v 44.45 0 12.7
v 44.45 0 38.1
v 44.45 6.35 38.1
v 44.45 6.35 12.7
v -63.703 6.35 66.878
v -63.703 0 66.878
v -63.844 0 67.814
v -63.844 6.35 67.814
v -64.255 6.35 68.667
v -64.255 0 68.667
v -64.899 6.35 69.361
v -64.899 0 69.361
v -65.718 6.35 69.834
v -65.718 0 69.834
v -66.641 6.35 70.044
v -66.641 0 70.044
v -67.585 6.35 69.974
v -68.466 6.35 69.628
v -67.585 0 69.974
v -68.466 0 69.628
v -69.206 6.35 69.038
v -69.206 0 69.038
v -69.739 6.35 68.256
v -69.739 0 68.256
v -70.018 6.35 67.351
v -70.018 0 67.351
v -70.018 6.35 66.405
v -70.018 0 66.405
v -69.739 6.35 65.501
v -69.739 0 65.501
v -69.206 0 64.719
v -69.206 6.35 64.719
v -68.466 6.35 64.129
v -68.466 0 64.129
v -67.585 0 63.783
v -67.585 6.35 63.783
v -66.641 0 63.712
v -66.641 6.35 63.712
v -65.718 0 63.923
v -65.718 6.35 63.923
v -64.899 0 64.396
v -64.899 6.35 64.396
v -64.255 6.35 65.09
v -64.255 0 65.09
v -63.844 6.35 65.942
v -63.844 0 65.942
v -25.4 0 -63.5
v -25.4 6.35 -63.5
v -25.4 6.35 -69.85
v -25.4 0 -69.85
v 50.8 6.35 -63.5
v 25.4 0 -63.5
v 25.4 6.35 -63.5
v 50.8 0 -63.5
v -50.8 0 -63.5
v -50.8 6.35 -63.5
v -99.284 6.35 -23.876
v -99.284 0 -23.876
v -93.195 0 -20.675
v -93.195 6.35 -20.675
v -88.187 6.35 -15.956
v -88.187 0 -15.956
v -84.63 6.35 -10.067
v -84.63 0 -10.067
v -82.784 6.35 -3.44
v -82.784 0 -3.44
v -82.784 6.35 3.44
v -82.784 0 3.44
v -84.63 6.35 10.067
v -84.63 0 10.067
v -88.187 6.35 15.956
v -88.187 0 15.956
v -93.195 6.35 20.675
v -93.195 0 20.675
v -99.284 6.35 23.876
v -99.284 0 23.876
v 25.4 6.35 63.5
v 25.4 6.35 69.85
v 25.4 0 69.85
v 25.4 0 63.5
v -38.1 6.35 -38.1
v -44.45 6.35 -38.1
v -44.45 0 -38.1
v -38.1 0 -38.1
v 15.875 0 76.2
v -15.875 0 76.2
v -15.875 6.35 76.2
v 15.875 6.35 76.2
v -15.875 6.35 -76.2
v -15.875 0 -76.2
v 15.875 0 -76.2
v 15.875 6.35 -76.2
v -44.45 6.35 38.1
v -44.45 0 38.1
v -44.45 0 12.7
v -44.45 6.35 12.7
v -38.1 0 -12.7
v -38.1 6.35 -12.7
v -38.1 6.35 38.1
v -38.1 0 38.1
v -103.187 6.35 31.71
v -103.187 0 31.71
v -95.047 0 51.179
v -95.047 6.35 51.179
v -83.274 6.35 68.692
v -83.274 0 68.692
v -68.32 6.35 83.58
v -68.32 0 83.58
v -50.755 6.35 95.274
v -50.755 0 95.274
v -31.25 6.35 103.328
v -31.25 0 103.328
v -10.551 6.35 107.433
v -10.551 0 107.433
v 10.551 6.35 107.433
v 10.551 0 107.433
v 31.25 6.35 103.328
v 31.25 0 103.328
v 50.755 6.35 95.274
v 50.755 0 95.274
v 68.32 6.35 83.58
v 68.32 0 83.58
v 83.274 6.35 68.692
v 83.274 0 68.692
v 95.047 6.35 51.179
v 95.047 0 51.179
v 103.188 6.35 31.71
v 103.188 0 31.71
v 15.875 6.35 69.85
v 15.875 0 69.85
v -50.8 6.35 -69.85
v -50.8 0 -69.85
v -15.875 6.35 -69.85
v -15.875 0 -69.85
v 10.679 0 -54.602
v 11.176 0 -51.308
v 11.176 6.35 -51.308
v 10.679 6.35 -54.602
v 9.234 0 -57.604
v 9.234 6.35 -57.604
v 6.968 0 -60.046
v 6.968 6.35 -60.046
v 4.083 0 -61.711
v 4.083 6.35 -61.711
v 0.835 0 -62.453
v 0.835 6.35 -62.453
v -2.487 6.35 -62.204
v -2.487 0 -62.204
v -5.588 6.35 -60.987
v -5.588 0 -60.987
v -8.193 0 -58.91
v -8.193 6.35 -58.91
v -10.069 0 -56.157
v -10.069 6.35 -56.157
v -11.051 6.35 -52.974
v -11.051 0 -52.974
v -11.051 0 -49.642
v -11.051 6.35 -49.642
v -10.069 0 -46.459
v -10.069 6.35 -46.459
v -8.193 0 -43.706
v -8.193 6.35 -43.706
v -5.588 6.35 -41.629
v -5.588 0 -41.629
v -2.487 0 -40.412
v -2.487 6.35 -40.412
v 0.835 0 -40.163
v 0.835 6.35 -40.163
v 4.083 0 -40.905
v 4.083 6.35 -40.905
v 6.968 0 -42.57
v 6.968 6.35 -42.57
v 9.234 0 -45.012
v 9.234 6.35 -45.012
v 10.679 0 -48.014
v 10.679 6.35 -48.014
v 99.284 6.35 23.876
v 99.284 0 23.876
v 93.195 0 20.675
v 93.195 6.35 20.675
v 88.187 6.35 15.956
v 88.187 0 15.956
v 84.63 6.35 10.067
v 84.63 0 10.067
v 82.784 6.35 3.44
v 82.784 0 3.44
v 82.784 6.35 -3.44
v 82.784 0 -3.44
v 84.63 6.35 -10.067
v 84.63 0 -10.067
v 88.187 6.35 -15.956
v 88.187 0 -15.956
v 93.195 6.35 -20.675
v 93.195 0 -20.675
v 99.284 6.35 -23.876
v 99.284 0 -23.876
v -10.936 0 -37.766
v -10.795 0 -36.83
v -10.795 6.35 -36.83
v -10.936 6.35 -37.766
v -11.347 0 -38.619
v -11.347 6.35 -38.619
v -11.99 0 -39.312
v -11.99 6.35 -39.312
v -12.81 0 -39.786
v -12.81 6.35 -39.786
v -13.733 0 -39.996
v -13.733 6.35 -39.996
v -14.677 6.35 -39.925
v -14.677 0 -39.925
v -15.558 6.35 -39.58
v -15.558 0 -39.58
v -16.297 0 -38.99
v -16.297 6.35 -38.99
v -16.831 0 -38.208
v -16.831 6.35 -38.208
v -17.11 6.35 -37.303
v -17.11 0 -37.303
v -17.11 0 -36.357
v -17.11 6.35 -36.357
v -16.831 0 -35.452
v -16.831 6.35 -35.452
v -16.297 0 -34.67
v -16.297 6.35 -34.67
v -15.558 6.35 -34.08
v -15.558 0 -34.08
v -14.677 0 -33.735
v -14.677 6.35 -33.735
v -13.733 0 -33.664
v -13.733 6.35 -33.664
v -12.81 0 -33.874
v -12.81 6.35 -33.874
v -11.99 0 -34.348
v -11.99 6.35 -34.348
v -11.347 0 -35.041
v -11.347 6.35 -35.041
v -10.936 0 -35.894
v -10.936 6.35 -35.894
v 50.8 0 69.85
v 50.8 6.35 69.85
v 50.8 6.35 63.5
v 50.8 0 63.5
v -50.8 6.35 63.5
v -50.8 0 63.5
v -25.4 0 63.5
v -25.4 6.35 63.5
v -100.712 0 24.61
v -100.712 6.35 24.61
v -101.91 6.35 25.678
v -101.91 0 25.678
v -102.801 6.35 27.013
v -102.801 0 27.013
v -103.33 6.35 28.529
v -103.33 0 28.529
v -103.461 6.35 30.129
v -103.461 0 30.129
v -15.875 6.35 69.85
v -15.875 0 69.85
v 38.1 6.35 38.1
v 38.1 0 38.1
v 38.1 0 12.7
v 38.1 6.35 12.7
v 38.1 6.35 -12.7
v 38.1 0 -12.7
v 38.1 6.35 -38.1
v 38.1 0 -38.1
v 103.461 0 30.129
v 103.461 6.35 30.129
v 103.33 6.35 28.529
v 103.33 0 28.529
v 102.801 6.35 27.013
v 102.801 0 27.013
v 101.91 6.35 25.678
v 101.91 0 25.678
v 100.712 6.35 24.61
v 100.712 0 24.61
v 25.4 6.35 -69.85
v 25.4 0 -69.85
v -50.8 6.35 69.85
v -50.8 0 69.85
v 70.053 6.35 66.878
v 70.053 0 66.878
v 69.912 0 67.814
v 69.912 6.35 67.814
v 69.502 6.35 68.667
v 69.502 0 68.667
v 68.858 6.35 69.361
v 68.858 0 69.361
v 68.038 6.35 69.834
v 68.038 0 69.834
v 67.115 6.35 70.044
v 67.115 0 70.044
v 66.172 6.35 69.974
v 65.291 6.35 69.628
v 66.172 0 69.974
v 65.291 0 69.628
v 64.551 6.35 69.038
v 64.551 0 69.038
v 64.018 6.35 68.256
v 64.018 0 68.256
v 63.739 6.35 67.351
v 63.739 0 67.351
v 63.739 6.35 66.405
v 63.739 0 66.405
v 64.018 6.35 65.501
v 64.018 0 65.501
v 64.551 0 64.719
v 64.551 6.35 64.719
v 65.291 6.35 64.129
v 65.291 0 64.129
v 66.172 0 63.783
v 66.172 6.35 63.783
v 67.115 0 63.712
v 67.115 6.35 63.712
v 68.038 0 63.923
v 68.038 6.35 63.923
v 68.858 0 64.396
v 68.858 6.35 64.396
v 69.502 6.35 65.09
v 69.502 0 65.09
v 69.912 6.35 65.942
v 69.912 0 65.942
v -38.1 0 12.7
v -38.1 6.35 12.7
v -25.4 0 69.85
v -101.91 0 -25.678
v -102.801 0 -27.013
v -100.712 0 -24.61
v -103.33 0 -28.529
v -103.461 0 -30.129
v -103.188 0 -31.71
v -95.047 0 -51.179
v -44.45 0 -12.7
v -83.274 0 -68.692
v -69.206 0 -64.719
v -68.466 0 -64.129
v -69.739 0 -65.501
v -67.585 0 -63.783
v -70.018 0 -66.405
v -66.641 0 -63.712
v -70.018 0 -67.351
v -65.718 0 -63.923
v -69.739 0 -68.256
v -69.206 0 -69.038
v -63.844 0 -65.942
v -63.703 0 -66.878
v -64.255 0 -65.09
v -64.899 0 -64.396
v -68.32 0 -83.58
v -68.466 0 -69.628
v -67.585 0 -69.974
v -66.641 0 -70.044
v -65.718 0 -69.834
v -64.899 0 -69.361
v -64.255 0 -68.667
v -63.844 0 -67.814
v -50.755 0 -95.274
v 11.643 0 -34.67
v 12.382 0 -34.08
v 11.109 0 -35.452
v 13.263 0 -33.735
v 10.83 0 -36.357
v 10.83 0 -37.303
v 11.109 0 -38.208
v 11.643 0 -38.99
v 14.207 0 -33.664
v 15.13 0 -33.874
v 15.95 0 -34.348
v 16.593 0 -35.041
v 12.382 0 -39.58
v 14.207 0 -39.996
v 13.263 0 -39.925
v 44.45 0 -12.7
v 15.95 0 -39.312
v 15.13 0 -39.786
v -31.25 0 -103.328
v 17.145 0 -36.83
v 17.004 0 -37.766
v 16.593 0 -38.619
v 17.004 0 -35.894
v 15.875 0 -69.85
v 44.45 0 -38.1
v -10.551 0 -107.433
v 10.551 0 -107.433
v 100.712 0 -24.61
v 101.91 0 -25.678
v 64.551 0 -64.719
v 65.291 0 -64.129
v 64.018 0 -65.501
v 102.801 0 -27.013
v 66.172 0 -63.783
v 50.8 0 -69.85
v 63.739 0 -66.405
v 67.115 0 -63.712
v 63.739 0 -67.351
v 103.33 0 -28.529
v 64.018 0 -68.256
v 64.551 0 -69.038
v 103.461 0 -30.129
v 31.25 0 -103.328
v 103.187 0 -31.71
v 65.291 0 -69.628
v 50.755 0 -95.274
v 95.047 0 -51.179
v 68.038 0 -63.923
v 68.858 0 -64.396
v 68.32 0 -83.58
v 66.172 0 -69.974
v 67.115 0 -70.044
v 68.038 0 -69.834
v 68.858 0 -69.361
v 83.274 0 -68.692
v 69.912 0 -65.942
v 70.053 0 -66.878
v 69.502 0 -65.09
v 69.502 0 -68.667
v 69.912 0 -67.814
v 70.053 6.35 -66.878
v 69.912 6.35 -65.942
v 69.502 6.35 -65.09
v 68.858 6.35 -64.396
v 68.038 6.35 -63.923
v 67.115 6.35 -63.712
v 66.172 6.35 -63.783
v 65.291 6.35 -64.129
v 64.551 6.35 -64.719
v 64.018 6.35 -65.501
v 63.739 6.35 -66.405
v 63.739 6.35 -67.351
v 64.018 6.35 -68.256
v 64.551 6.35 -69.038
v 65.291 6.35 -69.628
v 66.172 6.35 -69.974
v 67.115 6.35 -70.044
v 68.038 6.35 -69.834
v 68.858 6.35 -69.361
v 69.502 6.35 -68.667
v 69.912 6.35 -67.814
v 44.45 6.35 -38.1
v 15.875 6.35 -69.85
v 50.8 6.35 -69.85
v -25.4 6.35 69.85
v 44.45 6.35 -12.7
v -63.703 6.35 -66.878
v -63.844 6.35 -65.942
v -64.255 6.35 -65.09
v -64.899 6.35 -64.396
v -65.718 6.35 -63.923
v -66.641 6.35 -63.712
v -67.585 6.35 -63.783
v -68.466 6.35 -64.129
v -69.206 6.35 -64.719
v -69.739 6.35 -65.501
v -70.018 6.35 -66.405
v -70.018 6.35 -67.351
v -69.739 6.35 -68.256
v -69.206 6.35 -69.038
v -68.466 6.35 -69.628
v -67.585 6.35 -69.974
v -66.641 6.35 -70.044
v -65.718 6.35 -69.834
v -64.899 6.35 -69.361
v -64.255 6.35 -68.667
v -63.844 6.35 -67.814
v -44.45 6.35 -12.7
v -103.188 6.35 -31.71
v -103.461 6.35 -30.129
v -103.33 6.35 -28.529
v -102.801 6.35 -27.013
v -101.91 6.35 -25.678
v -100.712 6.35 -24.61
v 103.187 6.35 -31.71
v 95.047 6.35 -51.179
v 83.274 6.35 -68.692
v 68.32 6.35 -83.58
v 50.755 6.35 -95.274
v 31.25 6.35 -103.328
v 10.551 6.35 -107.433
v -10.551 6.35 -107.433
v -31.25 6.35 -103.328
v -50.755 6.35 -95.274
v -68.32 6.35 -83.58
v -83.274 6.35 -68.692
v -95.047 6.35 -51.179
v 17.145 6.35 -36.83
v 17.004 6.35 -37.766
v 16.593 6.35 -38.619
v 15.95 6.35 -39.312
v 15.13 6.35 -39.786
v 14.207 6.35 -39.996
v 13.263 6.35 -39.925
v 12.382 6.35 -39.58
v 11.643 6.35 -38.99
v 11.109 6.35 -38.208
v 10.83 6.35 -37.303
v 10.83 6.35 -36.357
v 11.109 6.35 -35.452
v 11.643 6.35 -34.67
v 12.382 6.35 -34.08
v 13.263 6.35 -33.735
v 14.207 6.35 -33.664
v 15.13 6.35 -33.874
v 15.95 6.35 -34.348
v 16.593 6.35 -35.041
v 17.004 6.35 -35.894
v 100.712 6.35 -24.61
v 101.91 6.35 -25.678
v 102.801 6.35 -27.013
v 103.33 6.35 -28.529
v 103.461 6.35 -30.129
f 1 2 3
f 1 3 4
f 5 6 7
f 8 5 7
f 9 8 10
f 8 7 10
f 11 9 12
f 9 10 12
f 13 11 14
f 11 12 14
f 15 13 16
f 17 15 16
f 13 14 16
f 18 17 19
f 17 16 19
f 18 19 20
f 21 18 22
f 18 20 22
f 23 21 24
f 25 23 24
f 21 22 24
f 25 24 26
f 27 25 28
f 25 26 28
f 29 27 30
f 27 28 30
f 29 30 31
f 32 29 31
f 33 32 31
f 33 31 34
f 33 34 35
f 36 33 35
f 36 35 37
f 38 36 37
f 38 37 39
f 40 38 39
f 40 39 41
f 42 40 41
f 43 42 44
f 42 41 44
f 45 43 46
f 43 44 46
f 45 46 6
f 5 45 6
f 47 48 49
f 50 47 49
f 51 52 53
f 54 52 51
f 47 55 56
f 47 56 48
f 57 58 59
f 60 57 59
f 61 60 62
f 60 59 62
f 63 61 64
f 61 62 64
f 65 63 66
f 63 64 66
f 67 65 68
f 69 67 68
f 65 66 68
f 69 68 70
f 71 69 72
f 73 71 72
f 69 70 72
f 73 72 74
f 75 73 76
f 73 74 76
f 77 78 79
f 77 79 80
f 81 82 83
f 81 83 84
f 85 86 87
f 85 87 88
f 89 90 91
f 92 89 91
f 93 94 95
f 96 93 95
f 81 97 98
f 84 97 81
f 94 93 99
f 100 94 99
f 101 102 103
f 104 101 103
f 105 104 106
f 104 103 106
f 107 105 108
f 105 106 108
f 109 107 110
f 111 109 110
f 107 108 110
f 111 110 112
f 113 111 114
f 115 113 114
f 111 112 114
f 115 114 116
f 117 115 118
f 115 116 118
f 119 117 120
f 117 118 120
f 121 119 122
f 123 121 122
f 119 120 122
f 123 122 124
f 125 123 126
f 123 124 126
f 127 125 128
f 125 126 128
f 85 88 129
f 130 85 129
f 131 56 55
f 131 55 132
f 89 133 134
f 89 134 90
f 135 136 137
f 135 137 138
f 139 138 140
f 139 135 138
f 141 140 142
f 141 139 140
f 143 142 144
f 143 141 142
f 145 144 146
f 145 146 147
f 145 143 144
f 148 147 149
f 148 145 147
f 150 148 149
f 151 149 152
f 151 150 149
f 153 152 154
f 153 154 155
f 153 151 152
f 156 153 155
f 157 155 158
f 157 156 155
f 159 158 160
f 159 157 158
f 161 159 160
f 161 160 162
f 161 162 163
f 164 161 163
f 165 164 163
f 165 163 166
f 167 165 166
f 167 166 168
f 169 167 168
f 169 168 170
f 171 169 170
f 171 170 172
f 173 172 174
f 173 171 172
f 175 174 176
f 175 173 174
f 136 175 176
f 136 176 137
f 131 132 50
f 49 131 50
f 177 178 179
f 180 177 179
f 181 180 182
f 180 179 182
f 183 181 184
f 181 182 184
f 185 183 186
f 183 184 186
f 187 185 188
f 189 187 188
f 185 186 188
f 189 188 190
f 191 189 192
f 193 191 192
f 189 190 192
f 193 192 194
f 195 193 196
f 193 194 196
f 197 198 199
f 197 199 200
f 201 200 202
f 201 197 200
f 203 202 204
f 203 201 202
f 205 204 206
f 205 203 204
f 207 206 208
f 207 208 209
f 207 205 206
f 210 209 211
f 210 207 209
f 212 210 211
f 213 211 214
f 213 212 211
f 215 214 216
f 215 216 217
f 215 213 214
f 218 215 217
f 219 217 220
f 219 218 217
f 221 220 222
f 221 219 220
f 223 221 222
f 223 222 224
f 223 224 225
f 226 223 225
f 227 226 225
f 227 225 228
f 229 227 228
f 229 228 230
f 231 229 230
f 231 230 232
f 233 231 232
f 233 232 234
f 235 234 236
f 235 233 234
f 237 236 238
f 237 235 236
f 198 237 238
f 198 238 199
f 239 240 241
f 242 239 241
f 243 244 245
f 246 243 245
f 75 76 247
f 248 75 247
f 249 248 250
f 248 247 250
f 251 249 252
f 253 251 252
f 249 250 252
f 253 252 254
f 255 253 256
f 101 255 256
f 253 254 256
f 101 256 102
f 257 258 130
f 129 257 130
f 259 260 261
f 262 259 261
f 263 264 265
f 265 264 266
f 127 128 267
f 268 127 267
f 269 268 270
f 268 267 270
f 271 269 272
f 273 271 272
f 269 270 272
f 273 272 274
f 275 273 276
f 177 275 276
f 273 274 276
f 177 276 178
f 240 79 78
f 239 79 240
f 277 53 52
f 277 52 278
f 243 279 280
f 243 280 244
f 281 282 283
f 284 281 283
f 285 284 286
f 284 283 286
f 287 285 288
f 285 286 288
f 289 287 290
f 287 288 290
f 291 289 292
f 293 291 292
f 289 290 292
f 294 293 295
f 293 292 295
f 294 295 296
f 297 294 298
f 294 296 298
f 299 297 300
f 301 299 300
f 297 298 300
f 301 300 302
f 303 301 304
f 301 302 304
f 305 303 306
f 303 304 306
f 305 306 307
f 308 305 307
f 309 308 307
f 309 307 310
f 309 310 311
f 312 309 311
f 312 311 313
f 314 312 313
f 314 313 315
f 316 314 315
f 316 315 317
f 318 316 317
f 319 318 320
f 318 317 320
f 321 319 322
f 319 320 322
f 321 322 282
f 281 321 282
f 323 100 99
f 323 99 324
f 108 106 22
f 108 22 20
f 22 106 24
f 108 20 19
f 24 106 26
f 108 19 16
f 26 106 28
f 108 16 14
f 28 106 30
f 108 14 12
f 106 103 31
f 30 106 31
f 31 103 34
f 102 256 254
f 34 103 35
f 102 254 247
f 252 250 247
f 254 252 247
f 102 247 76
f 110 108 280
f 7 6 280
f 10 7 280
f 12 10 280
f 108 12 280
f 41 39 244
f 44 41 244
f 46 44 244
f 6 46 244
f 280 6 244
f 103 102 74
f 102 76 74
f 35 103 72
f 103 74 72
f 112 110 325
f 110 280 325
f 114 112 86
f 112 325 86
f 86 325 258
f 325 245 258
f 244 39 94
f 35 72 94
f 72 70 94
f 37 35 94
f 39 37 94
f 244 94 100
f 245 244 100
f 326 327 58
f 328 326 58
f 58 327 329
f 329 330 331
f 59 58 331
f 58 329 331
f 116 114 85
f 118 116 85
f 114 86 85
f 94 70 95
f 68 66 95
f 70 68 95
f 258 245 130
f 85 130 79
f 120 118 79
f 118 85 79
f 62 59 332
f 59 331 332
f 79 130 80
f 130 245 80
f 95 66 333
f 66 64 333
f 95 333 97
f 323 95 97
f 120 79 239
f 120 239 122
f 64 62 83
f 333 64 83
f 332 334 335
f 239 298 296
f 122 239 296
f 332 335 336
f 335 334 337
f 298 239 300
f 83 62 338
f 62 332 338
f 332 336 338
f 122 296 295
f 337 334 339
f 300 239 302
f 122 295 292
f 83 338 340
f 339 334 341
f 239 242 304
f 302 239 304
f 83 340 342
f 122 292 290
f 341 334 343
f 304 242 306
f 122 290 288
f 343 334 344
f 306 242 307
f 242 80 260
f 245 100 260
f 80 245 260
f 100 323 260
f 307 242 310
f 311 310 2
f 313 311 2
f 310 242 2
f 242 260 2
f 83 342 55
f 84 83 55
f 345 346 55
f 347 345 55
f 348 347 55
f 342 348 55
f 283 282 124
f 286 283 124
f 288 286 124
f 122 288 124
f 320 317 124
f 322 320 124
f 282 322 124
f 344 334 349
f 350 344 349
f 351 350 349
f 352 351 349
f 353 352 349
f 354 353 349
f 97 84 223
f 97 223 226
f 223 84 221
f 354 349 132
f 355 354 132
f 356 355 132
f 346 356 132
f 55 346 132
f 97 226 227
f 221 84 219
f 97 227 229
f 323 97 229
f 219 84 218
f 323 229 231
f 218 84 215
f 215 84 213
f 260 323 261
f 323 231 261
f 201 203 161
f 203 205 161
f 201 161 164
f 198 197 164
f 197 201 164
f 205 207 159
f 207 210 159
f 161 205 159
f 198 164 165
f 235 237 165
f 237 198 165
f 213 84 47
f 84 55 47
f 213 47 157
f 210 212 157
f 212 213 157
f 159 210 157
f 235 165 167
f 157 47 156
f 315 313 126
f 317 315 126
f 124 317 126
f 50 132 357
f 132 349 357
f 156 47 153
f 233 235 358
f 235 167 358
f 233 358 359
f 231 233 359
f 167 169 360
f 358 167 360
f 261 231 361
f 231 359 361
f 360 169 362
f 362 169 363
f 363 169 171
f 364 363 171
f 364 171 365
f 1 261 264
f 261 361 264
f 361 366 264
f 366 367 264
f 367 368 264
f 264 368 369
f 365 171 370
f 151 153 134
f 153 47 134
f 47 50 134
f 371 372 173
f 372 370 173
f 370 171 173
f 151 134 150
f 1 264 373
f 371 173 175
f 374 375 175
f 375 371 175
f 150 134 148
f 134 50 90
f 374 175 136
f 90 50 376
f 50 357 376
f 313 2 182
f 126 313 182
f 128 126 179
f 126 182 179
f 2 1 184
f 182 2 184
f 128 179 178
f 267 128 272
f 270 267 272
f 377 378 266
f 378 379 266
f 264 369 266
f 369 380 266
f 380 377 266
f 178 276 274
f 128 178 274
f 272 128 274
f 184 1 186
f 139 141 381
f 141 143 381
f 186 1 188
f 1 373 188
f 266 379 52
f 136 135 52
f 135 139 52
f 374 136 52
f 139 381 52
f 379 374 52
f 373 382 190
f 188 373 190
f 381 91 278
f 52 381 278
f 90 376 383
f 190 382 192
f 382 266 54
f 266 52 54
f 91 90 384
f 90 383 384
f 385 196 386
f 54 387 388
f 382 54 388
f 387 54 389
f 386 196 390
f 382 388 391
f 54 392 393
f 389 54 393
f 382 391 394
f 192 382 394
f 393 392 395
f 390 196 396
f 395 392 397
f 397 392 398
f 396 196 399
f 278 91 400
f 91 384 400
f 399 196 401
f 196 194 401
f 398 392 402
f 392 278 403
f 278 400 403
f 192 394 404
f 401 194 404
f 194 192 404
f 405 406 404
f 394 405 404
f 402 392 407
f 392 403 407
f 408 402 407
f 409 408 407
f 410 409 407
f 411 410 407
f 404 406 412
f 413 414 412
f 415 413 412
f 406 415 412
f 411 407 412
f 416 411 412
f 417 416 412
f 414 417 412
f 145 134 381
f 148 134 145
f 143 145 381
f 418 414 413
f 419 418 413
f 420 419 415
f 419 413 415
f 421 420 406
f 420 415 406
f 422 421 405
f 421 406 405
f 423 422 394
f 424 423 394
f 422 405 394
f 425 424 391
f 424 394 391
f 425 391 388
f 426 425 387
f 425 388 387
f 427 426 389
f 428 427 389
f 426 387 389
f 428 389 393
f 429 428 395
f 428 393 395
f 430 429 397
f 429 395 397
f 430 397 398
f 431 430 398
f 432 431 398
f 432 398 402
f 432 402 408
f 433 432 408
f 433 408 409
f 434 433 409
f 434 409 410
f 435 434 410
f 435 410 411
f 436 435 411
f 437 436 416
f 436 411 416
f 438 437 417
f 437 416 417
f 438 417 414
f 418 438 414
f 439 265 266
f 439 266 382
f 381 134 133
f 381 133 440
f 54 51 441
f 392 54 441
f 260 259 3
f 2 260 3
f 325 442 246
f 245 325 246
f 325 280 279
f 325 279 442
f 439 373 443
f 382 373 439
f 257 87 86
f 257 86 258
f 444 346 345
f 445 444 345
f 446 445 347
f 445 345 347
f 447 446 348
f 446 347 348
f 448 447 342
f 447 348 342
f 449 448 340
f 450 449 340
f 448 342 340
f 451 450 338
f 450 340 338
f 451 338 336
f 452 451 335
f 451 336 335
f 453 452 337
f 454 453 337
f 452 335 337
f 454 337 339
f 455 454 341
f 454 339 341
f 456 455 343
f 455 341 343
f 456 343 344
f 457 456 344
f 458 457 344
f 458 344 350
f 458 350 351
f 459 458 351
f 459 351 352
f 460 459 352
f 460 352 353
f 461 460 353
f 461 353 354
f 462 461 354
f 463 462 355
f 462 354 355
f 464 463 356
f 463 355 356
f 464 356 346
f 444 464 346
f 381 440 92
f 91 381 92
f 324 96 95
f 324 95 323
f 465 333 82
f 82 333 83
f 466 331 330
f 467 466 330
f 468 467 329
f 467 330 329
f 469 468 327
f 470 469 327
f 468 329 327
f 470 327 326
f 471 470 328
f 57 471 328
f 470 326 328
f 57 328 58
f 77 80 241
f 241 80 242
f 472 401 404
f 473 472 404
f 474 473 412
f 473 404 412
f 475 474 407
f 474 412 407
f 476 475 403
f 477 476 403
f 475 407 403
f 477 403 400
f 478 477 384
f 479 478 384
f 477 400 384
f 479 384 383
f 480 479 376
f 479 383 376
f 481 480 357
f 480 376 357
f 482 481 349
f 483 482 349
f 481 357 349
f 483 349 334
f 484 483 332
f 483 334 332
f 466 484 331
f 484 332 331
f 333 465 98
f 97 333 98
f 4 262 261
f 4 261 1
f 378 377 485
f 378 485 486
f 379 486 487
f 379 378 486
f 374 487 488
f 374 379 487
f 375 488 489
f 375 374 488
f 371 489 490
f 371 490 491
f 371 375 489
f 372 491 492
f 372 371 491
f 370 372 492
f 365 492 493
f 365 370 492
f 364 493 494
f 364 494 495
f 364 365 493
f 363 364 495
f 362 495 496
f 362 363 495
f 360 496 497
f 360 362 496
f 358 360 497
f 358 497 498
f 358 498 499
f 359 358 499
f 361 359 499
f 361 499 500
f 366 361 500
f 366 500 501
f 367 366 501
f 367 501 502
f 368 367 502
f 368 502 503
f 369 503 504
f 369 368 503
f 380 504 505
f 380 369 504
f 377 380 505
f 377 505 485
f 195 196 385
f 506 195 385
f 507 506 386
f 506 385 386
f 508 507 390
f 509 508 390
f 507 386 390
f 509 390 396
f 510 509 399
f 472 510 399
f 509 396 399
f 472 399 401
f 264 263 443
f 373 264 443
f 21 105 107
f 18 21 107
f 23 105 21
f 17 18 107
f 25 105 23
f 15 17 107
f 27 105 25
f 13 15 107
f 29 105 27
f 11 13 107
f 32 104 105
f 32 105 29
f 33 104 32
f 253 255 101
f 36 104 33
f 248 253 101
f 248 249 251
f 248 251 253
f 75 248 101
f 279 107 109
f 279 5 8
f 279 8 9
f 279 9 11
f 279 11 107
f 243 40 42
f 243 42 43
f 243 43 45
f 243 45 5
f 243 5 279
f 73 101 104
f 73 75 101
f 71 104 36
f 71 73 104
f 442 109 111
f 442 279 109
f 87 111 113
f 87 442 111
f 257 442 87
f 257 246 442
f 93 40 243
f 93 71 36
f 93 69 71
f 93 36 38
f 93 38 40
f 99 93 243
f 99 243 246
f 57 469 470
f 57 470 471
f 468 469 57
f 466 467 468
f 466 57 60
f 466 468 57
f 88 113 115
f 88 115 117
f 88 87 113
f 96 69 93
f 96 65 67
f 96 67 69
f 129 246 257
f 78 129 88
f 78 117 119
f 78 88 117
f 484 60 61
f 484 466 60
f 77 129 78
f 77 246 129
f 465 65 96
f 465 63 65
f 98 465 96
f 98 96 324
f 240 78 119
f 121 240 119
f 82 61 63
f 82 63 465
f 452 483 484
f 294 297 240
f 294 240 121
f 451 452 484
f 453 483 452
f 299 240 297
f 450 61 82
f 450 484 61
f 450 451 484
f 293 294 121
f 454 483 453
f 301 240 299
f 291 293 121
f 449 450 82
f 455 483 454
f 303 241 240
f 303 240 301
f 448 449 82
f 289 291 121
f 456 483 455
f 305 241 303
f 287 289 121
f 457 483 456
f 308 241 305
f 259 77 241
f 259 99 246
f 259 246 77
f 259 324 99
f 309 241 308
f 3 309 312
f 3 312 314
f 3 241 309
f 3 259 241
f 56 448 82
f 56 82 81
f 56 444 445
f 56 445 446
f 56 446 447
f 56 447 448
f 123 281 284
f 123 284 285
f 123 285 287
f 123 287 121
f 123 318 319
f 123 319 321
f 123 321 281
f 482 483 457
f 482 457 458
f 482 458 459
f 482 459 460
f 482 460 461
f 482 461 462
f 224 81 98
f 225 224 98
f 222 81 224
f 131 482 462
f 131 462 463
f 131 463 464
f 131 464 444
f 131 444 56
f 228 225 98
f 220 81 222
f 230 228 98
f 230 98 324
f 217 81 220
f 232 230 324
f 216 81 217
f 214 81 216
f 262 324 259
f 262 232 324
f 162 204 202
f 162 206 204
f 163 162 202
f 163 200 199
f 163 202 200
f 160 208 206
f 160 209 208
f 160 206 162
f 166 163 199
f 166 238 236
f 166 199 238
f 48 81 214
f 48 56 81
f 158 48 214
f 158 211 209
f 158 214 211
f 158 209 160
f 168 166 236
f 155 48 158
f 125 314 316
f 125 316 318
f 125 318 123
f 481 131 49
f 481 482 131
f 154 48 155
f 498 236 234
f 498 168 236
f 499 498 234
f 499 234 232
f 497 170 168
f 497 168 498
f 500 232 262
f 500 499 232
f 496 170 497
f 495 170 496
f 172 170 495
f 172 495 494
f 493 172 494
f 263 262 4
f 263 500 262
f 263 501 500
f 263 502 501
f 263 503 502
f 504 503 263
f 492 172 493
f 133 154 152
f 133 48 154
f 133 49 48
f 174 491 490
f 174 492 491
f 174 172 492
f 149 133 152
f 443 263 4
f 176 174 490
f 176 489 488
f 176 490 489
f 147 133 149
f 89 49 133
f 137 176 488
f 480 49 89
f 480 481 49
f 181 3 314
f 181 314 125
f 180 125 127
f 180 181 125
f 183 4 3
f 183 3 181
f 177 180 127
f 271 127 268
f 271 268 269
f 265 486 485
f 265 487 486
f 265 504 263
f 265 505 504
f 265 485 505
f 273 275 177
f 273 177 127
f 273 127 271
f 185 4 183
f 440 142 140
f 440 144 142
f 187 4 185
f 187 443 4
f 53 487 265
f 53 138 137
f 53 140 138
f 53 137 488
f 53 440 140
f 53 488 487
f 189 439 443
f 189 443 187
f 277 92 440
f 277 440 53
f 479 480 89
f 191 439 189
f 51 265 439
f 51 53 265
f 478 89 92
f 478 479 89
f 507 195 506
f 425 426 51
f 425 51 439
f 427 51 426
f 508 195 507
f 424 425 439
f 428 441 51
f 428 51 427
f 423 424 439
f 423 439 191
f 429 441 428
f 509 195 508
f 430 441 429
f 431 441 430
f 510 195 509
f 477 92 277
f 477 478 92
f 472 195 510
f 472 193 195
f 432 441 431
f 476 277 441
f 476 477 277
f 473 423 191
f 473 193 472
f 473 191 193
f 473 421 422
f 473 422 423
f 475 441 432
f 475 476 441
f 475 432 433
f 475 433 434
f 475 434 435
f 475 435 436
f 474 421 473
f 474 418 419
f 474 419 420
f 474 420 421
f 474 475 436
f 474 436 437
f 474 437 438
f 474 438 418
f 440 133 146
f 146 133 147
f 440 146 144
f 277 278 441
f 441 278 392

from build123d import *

# Parameters (mm, degrees)
SKETCH1_R           = 11.176
SKETCH1_R_2         = 3.175
SKETCH1_W           = 25.4
SKETCH1_H           = 6.35
SKETCH1_W_2         = 6.35
SKETCH1_H_2         = 25.4
SKETCH1_W_3         = 31.75
BOSS_EXTRUDE1_DEPTH = 6.35
SKETCH2_R           = 3.175
CUT_EXTRUDE1_DEPTH  = 6.35


with BuildPart() as part:
    # Sketch1 → Boss-Extrude1 (new body)
    with BuildSketch(Plane(origin=(0, 0, 0), x_dir=(1, 0, 0), z_dir=(0, 1, 0))):
        with BuildLine():
            ThreePointArc((-103.1875, -31.710287664), (0, -107.95), (103.1875, -31.710287664))
            ThreePointArc((103.1875, -31.710287664), (102.801250262, -27.013165433), (99.284117647, -23.8759813))
            ThreePointArc((99.284117647, -23.8759813), (82.55, 0), (99.284117647, 23.8759813))
            ThreePointArc((99.284117647, 23.8759813), (102.801250262, 27.013165433), (103.1875, 31.710287664))
            ThreePointArc((103.1875, 31.710287664), (0, 107.95), (-103.1875, 31.710287664))
            ThreePointArc((-103.1875, 31.710287664), (-102.801250262, 27.013165433), (-99.284117647, 23.8759813))
            ThreePointArc((-99.284117647, 23.8759813), (-82.55, 0), (-99.284117647, -23.8759813))
            ThreePointArc((-99.284117647, -23.8759813), (-102.801250262, -27.013165433), (-103.1875, -31.710287664))
        make_face()
        with Locations((0, 51.308)):
            Circle(SKETCH1_R, mode=Mode.SUBTRACT)
        with Locations((13.97, 36.83)):
            Circle(SKETCH1_R_2, mode=Mode.SUBTRACT)
        with Locations((-13.97, 36.83)):
            Circle(SKETCH1_R_2, mode=Mode.SUBTRACT)
        with Locations((-38.1, 66.675)):
            Rectangle(SKETCH1_W, SKETCH1_H, mode=Mode.SUBTRACT)
        with Locations((38.1, 66.675)):
            Rectangle(SKETCH1_W, SKETCH1_H, mode=Mode.SUBTRACT)
        with Locations((-38.1, -66.675)):
            Rectangle(SKETCH1_W, SKETCH1_H, mode=Mode.SUBTRACT)
        with Locations((38.1, -66.675)):
            Rectangle(SKETCH1_W, SKETCH1_H, mode=Mode.SUBTRACT)
        with Locations((41.275, -25.4)):
            Rectangle(SKETCH1_W_2, SKETCH1_H_2, mode=Mode.SUBTRACT)
        with Locations((41.275, 25.4)):
            Rectangle(SKETCH1_W_2, SKETCH1_H_2, mode=Mode.SUBTRACT)
        with Locations((-41.275, -25.4)):
            Rectangle(SKETCH1_W_2, SKETCH1_H_2, mode=Mode.SUBTRACT)
        with Locations((-41.275, 25.4)):
            Rectangle(SKETCH1_W_2, SKETCH1_H_2, mode=Mode.SUBTRACT)
        with Locations((0, 73.025)):
            Rectangle(SKETCH1_W_3, SKETCH1_H, mode=Mode.SUBTRACT)
        with Locations((0, -73.025)):
            Rectangle(SKETCH1_W_3, SKETCH1_H, mode=Mode.SUBTRACT)
    extrude(amount=BOSS_EXTRUDE1_DEPTH)

    # Sketch2 → Cut-Extrude1 (cut)
    with BuildSketch(Plane.XZ):
        with Locations((-66.8782, 66.8782)):
            Circle(SKETCH2_R)
        with Locations((66.8782, 66.8782)):
            Circle(SKETCH2_R)
        with Locations((66.8782, -66.8782)):
            Circle(SKETCH2_R)
        with Locations((-66.8782, -66.8782)):
            Circle(SKETCH2_R)
    extrude(amount=-CUT_EXTRUDE1_DEPTH, mode=Mode.SUBTRACT)


solid = part.part
